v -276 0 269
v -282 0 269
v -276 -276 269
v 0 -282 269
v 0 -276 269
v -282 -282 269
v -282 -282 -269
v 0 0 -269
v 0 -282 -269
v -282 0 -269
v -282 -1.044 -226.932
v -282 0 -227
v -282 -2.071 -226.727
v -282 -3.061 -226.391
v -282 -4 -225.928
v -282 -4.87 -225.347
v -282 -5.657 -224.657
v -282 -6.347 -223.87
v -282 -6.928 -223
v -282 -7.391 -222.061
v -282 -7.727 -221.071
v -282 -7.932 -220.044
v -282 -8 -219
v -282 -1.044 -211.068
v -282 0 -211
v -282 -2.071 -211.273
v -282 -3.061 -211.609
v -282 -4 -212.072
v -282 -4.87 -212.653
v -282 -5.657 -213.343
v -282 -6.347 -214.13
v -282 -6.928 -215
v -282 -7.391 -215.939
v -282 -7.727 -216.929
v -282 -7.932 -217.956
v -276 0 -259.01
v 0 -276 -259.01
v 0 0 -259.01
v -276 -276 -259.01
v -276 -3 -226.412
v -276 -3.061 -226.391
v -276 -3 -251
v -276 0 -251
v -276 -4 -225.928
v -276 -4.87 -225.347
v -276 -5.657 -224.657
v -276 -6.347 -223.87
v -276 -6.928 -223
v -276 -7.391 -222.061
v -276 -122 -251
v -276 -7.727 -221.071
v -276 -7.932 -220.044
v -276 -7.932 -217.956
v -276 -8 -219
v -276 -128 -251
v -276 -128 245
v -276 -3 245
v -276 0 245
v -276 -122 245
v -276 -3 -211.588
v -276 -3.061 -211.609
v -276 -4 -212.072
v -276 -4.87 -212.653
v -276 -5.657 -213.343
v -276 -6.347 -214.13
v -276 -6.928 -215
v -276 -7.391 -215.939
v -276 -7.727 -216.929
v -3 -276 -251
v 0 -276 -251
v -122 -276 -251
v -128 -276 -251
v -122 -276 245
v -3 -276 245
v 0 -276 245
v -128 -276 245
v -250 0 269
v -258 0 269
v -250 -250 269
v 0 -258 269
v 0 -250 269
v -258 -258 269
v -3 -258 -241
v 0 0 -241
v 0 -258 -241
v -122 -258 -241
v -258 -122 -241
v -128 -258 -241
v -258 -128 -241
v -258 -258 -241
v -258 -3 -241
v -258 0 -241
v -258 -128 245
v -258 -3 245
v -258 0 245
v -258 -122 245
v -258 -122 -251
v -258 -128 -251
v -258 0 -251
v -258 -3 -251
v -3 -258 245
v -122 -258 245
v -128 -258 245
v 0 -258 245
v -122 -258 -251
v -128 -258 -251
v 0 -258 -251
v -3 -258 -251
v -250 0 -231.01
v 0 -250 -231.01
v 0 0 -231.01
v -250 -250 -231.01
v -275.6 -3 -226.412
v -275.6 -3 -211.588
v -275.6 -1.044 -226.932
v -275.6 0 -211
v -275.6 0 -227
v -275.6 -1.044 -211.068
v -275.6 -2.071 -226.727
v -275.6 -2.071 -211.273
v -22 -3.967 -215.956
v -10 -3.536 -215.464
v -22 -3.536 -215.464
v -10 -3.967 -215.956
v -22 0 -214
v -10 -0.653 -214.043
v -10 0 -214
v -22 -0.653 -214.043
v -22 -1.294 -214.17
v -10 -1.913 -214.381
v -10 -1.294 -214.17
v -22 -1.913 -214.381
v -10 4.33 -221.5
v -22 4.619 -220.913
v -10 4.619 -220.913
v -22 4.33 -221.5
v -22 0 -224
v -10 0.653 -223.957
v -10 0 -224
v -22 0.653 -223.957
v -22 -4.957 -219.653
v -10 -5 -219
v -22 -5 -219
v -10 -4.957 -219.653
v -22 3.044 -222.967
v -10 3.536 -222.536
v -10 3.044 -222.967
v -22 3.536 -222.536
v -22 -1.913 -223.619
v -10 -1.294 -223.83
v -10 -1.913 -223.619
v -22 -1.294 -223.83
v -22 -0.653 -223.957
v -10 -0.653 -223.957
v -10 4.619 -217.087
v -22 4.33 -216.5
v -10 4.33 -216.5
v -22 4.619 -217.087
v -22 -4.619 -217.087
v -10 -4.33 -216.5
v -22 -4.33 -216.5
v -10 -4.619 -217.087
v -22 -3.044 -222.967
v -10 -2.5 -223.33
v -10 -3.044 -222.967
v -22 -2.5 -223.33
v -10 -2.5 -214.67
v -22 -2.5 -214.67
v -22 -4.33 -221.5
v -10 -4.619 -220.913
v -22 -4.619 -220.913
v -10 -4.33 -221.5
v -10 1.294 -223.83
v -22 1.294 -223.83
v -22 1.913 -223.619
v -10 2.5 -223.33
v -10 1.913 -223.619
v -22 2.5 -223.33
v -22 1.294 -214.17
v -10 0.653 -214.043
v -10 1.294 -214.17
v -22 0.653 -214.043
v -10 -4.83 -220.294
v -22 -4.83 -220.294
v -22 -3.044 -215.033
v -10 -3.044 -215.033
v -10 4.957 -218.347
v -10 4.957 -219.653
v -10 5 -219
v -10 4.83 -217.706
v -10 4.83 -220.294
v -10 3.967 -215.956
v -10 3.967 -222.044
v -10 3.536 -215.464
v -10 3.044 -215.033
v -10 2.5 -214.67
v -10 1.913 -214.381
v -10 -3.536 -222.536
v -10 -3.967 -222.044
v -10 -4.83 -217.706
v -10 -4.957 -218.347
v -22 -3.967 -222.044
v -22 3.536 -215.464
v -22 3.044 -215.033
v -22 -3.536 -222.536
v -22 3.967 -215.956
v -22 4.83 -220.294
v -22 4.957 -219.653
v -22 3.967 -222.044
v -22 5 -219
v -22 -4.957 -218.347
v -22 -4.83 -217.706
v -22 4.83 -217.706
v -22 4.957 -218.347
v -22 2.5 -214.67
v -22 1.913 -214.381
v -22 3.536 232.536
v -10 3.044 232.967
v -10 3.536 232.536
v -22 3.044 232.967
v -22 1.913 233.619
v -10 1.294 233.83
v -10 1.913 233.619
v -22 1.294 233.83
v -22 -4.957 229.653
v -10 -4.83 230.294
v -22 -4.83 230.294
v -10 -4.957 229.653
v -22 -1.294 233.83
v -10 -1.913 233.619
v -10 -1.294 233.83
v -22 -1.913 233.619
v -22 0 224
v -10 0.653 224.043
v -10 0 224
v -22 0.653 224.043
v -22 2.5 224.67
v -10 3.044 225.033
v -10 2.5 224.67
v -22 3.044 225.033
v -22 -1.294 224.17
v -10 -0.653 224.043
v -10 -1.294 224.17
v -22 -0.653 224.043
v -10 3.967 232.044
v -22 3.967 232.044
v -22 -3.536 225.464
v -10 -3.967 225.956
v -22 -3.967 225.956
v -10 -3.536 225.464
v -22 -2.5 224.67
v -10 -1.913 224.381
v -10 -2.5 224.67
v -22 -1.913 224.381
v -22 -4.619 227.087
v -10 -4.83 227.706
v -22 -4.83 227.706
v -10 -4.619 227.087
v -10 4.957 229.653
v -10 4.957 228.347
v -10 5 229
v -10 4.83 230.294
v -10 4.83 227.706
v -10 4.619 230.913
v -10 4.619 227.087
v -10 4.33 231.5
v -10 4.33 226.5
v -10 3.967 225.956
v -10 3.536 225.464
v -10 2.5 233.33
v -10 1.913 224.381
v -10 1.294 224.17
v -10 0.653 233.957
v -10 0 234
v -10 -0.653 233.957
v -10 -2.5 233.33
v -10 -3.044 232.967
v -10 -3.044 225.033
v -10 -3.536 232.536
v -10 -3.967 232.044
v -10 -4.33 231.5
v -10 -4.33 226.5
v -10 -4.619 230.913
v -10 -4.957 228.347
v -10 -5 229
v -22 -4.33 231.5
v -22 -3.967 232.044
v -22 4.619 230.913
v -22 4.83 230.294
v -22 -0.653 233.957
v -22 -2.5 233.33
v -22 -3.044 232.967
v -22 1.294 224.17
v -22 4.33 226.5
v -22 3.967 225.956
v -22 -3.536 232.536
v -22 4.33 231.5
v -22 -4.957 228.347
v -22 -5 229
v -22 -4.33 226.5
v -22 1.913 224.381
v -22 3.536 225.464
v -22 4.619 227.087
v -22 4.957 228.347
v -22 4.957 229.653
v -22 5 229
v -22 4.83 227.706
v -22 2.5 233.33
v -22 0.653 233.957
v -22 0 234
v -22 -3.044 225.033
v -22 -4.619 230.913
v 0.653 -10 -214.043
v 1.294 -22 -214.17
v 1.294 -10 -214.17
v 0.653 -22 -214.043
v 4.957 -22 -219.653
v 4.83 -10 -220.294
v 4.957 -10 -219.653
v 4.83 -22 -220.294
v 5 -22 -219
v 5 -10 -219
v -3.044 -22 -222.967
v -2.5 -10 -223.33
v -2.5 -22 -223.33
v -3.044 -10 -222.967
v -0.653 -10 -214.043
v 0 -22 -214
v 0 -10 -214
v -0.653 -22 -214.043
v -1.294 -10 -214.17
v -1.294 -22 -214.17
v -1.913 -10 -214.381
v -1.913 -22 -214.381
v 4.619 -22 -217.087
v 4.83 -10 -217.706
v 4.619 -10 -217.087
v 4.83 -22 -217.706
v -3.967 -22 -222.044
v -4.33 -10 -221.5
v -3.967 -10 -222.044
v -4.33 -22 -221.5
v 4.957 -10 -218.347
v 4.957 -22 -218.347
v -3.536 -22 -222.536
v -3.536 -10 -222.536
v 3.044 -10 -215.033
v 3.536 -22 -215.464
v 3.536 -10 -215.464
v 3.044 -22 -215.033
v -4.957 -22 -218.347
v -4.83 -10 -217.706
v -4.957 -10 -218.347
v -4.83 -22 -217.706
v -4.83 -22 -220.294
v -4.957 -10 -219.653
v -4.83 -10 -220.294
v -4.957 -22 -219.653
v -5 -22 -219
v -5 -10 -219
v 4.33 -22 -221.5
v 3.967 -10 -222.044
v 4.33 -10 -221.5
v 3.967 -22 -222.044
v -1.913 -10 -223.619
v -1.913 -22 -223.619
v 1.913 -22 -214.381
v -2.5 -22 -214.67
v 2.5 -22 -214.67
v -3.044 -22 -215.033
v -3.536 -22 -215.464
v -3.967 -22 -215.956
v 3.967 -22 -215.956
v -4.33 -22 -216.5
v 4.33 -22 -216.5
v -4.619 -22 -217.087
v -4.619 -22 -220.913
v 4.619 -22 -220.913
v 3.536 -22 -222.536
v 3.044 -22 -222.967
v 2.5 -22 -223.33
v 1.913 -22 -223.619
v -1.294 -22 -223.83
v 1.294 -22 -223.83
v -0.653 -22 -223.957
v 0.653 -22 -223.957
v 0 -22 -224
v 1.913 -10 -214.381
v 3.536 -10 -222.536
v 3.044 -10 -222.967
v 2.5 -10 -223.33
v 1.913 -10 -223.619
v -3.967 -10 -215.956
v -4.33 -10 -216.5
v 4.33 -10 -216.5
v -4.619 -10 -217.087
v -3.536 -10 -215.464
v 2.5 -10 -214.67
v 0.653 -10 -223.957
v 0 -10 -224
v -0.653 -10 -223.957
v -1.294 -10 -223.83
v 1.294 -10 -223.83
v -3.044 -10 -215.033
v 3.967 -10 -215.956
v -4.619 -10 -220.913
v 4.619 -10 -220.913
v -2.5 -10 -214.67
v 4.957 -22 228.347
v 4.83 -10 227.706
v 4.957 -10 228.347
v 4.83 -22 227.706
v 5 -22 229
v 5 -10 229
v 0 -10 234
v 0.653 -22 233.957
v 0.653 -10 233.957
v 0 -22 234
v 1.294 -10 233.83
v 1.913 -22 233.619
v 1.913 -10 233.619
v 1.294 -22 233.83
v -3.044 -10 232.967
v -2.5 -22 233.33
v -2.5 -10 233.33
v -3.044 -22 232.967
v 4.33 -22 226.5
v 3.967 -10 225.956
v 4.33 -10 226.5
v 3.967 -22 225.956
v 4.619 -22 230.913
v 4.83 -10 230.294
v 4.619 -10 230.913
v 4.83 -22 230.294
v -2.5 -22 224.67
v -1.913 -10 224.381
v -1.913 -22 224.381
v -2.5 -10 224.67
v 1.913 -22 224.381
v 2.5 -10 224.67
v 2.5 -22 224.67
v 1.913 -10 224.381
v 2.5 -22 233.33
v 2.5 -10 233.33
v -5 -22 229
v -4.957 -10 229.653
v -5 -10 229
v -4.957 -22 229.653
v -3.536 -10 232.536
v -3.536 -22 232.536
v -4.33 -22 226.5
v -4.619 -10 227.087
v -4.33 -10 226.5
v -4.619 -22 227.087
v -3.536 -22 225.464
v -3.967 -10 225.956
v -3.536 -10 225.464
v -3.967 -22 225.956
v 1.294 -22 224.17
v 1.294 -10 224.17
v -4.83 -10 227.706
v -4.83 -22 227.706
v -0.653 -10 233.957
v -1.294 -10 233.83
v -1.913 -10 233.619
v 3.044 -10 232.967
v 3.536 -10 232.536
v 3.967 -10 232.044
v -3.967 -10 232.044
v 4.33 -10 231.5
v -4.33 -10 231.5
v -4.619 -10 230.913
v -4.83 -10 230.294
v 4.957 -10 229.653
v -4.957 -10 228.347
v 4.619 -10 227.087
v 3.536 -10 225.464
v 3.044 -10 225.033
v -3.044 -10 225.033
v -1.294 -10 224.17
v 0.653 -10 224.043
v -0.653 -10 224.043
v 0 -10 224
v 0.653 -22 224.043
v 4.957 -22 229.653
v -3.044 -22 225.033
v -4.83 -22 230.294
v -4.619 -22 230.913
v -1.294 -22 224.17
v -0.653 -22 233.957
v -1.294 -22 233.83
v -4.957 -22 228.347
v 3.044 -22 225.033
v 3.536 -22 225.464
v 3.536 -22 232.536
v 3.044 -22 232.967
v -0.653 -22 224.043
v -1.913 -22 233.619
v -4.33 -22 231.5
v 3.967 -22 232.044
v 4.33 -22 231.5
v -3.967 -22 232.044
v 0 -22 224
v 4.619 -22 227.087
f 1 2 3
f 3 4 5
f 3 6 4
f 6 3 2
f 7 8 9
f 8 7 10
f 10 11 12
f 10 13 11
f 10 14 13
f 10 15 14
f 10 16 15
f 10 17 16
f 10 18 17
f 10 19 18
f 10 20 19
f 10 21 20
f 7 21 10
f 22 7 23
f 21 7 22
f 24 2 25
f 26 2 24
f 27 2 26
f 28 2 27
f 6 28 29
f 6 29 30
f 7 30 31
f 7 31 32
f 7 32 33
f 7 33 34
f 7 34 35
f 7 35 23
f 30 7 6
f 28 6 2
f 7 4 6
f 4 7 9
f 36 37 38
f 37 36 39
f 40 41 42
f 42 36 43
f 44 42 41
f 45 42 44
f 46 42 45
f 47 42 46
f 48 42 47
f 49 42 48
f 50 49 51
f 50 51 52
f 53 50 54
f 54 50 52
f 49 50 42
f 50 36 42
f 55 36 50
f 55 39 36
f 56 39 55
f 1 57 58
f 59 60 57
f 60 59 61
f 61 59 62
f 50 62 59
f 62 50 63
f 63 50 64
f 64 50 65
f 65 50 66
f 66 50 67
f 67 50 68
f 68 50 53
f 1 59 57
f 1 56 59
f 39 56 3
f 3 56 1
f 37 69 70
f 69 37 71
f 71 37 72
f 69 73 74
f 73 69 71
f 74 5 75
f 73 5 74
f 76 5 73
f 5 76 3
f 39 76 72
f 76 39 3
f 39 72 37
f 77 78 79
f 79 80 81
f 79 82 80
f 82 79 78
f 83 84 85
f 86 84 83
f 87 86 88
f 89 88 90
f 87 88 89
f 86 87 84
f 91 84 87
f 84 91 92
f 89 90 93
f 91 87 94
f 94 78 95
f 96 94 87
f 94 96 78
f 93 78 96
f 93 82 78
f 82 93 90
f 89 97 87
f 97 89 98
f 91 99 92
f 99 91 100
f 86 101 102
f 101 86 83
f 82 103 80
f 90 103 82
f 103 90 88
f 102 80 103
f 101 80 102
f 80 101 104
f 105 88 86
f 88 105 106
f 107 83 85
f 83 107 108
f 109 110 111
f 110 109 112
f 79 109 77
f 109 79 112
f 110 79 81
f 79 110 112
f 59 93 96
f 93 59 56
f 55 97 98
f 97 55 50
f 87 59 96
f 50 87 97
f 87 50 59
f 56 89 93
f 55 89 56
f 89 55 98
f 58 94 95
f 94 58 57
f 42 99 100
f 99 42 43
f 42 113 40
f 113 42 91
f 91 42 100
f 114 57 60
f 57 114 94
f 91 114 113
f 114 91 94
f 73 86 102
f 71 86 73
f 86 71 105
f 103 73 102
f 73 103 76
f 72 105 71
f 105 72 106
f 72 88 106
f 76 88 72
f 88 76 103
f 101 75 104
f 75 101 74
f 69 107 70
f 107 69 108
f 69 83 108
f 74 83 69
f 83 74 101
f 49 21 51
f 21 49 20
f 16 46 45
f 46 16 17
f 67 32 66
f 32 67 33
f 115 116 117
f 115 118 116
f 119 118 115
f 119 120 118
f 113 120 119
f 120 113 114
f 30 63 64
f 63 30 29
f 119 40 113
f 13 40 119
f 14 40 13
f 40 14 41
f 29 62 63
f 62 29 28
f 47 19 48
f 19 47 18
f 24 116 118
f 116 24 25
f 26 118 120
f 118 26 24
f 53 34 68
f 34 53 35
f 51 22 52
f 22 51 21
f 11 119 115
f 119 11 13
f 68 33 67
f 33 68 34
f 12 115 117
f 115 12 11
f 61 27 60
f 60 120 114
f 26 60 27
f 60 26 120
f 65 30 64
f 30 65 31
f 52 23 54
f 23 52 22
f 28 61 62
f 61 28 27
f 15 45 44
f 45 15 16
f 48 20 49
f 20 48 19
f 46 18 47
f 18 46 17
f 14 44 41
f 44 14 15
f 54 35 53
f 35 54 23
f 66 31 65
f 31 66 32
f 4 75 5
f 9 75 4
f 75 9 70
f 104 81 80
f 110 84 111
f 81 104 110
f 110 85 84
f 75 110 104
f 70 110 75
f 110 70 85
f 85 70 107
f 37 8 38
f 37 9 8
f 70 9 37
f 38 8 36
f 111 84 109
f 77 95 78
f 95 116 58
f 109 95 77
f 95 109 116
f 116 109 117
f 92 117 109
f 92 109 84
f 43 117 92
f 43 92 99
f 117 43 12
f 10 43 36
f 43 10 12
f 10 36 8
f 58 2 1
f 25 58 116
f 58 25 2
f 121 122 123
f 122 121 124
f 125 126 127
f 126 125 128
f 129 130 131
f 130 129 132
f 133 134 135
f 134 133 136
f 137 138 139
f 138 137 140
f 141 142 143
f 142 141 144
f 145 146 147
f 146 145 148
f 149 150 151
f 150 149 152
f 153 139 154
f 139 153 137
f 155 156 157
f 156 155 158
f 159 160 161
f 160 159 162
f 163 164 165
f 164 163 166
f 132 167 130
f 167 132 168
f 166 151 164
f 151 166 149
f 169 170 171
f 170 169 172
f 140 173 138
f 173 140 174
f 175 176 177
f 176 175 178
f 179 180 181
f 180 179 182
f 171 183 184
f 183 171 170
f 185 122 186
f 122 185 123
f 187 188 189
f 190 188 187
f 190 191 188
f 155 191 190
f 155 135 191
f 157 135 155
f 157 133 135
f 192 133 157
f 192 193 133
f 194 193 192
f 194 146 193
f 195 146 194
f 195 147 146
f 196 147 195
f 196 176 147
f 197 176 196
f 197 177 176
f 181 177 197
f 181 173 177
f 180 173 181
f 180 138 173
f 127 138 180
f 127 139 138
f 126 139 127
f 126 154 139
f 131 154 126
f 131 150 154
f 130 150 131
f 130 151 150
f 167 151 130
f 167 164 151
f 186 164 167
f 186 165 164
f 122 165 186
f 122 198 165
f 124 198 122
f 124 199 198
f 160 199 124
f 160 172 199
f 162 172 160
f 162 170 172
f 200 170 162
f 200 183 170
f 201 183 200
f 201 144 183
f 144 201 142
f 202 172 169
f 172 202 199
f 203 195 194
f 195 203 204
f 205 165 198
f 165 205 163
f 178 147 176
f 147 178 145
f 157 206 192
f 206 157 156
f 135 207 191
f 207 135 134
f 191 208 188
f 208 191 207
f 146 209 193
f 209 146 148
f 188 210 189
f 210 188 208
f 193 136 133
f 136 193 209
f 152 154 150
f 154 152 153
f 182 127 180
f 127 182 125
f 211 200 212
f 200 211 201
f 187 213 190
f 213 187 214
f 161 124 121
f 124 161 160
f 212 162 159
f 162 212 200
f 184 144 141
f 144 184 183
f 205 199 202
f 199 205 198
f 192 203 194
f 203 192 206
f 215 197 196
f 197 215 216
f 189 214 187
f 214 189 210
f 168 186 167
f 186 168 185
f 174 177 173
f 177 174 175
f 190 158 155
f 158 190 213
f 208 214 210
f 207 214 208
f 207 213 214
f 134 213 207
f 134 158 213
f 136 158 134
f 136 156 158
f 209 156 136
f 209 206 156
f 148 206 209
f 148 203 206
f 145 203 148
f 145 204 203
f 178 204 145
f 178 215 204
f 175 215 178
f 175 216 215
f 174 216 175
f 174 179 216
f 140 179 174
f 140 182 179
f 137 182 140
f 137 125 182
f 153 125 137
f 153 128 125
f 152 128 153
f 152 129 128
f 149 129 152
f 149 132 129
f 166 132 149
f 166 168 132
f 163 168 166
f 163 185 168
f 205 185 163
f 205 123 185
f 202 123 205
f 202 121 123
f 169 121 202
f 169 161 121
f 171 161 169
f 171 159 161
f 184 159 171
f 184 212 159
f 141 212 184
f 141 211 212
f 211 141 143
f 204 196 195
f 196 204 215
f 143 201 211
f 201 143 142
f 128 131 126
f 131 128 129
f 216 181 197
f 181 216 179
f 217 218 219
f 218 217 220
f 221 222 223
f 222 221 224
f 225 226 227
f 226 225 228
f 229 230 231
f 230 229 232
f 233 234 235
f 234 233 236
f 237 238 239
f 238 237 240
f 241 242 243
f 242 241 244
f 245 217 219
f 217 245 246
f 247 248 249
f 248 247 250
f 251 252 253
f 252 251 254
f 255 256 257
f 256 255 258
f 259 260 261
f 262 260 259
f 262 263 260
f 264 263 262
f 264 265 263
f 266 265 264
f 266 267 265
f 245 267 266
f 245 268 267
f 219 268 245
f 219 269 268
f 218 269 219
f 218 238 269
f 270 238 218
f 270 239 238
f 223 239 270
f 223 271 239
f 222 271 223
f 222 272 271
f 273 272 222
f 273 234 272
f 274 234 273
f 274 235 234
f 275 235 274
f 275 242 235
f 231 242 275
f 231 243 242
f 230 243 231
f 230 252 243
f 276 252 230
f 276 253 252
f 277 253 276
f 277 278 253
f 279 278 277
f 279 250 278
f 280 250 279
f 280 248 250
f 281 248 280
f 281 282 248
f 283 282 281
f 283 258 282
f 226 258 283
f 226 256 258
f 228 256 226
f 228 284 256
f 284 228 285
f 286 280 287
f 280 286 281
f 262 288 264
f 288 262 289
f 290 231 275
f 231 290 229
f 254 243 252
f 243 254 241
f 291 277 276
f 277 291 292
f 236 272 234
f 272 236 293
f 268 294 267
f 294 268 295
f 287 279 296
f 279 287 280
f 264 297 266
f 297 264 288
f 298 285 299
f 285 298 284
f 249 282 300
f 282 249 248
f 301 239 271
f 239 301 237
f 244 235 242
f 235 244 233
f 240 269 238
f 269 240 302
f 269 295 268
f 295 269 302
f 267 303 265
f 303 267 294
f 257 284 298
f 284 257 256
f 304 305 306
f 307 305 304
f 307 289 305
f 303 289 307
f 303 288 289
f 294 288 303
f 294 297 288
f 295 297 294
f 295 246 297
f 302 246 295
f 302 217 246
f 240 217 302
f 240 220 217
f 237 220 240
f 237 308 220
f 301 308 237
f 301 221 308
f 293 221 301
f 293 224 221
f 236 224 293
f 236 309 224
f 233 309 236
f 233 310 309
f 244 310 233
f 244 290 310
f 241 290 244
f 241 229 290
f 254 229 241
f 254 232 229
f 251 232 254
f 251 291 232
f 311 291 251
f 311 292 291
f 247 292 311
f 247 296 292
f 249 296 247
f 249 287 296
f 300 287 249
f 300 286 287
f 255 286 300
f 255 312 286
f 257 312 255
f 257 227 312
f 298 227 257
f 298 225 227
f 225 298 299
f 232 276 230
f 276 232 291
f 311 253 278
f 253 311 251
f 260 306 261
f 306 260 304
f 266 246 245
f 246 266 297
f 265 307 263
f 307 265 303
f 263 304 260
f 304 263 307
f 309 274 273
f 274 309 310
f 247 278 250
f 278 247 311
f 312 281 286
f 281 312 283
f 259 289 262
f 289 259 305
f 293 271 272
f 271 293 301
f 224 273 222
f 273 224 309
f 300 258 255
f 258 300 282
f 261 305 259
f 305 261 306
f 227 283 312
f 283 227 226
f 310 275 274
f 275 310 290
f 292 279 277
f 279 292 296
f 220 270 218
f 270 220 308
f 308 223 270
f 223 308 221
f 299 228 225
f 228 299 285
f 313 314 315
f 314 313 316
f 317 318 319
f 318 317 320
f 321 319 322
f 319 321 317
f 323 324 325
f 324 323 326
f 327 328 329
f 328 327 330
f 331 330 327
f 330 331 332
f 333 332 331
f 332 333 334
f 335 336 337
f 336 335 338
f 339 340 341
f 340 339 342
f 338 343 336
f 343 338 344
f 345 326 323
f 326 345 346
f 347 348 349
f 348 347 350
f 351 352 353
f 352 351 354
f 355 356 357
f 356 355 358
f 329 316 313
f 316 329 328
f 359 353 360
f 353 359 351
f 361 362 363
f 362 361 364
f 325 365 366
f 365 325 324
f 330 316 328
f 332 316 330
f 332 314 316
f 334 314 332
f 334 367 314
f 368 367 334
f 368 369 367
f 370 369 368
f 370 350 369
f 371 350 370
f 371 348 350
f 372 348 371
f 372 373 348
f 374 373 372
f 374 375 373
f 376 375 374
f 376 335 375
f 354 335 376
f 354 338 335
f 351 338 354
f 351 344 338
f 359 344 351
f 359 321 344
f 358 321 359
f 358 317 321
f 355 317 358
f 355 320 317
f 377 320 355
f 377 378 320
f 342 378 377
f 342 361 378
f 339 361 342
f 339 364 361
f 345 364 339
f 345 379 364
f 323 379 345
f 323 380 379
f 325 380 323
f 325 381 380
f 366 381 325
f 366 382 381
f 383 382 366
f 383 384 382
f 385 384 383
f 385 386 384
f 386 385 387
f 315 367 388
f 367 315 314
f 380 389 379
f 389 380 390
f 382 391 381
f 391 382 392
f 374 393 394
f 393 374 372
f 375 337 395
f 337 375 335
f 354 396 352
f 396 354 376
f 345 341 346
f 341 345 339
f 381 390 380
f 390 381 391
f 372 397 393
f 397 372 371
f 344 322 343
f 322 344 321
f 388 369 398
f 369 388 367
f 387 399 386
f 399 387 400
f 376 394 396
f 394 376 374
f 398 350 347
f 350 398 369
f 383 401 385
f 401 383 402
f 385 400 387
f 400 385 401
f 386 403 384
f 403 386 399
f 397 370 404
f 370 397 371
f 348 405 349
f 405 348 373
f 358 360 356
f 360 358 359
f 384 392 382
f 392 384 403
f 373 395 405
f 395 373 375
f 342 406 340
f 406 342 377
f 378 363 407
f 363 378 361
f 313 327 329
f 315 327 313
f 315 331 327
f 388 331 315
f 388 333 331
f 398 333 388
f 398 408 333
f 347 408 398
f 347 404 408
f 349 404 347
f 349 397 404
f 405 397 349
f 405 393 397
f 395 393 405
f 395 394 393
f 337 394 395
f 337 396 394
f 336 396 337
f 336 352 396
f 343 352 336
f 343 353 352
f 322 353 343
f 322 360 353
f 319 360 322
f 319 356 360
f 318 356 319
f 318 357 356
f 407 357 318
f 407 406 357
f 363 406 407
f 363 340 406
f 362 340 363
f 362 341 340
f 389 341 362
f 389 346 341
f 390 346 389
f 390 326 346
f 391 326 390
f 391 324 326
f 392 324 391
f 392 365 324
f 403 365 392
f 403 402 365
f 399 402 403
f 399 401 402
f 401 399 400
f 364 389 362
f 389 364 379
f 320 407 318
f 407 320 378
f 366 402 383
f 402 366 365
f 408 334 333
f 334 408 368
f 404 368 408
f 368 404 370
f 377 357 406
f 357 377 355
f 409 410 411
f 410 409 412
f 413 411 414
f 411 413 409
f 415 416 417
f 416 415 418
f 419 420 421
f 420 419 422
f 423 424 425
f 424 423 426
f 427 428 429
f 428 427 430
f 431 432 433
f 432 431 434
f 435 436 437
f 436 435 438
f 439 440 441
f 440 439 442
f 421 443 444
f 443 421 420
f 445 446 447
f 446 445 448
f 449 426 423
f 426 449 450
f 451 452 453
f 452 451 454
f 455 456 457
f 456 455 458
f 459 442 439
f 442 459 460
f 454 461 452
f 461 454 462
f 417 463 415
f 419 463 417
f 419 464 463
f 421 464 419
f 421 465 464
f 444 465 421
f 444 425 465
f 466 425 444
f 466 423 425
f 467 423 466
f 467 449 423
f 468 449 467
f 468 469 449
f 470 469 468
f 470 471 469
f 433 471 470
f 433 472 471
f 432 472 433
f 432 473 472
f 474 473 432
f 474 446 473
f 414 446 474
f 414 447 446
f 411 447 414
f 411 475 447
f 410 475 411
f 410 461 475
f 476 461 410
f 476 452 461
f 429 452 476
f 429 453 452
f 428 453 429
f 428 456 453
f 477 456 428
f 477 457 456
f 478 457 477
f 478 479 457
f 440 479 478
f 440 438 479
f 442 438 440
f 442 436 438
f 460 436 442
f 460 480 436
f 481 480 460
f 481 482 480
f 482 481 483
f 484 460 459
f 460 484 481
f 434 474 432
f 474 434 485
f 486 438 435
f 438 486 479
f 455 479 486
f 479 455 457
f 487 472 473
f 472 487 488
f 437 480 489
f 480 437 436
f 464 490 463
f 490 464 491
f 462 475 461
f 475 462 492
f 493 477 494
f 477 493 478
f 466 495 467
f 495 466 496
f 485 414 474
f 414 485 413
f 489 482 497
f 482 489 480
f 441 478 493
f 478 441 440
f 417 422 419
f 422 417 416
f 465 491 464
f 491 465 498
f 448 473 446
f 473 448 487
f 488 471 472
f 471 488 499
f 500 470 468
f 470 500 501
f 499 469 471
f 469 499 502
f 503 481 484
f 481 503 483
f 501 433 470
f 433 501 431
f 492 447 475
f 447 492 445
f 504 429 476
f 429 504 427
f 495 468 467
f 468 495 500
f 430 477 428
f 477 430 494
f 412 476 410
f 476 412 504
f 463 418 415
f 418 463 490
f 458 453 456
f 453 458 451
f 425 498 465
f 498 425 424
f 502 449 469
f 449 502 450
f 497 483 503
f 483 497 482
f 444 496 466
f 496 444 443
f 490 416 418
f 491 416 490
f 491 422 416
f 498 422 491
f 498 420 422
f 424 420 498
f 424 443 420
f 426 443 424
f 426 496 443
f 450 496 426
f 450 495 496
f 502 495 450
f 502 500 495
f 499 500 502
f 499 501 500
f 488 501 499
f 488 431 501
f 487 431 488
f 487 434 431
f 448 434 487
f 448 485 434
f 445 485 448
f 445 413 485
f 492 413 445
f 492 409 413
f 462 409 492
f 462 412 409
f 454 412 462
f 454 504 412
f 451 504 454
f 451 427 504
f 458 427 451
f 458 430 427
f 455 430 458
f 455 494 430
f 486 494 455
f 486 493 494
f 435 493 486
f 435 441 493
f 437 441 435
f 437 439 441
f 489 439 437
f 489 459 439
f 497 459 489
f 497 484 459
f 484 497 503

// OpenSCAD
/*
  Modular foam-fill planter shell (OpenSCAD)

  Goals:
  - Minimum internal soil volume: 500x500x500 mm (configurable, set >= 500)
  - Double-wall construction with an intentional foam cavity between outer shell and inner liner
  - Split into grid pieces so smaller printers can produce parts
  - Added structural ribs and thick base/walls for heavy soil loads
*/

$fn = 48;

// ---------------------------
// Core dimensions (mm)
// ---------------------------
inner_x = 500;   // minimum 500
inner_y = 500;   // minimum 500
inner_z = 500;   // minimum 500

// Structural thicknesses (tune for strength)
liner_wall_t = 8;    // inner wall touching soil
liner_base_t = 10;   // bottom of soil cavity
foam_gap_t   = 18;   // intentional void for polyurethane foam fill
outer_wall_t = 6;    // external shell wall
outer_base_t = 10;   // external shell base

// Reinforcement between outer shell and liner
rib_t = 6;
rib_count_per_side = 3;

// Split settings for small printers
split_x = 2;
split_y = 2;
piece_ix = 0;      // [0 : split_x-1]
piece_iy = 0;      // [0 : split_y-1]
part = "piece";    // ["piece", "full_preview"]

// Seam connectors
pin_d = 10;
pin_len = 12;
pin_clearance = 0.35;
pin_edge_offset = 22;

// Foam fill / vent ports
port_d = 16;
port_z_from_base = 40;

// ---------------------------
// Derived dimensions
// ---------------------------
ox = inner_x + 2*(liner_wall_t + foam_gap_t + outer_wall_t);
oy = inner_y + 2*(liner_wall_t + foam_gap_t + outer_wall_t);
oz = inner_z + liner_base_t + foam_gap_t + outer_base_t;

liner_ox = inner_x + 2*liner_wall_t;
liner_oy = inner_y + 2*liner_wall_t;
liner_oz = inner_z + liner_base_t;

soil_bottom_z = -oz/2 + outer_base_t + foam_gap_t + liner_base_t;

function x_min(i) = -ox/2 + i*ox/split_x;
function x_max(i) = -ox/2 + (i+1)*ox/split_x;
function y_min(j) = -oy/2 + j*oy/split_y;
function y_max(j) = -oy/2 + (j+1)*oy/split_y;

module outer_shell_only() {
  difference() {
    cube([ox, oy, oz], center=true);
    translate([0, 0, outer_base_t/2])
      cube([ox - 2*outer_wall_t, oy - 2*outer_wall_t, oz - outer_base_t + 0.02], center=true);
  }
}

module inner_liner_only() {
  difference() {
    translate([0, 0, -oz/2 + outer_base_t + foam_gap_t + liner_oz/2])
      cube([liner_ox, liner_oy, liner_oz], center=true);

    // Soil chamber (open top)
    translate([0, 0, -oz/2 + outer_base_t + foam_gap_t + liner_base_t + inner_z/2])
      cube([inner_x, inner_y, inner_z + 0.02], center=true);
  }
}

module tie_ribs() {
  // Ribs connect outer shell and inner liner for load transfer.
  // They are sparse so foam can still flow around/through during fill.

  z0 = -oz/2 + outer_base_t + 8;
  z1 = oz/2 - 24;
  step = (inner_y) / (rib_count_per_side + 1);

  // X-direction walls (left/right)
  for (k = [1 : rib_count_per_side]) {
    yy = -inner_y/2 + k*step;
    for (sx = [-1, 1]) {
      x_mid = sx*(inner_x/2 + liner_wall_t + foam_gap_t/2);
      translate([x_mid, yy, (z0+z1)/2])
        cube([foam_gap_t, rib_t, z1-z0], center=true);
    }
  }

  // Y-direction walls (front/back)
  stepx = (inner_x) / (rib_count_per_side + 1);
  for (k = [1 : rib_count_per_side]) {
    xx = -inner_x/2 + k*stepx;
    for (sy = [-1, 1]) {
      y_mid = sy*(inner_y/2 + liner_wall_t + foam_gap_t/2);
      translate([xx, y_mid, (z0+z1)/2])
        cube([rib_t, foam_gap_t, z1-z0], center=true);
    }
  }
}

module foam_ports() {
  // Ports into foam cavity; can be plugged after foam expansion.
  for (sx = [-1, 1]) {
    translate([sx*(ox/2 - outer_wall_t/2), 0, -oz/2 + outer_base_t + port_z_from_base])
      rotate([0, 90, 0])
        cylinder(h=outer_wall_t + 0.8, d=port_d, center=true);
  }
}

module full_planter() {
  difference() {
    union() {
      outer_shell_only();
      inner_liner_only();
      tie_ribs();
    }
    foam_ports();
  }
}

module piece_bounds(ix, iy) {
  x0 = x_min(ix);
  x1 = x_max(ix);
  y0 = y_min(iy);
  y1 = y_max(iy);
  translate([(x0+x1)/2, (y0+y1)/2, 0])
    cube([x1-x0, y1-y0, oz + 2], center=true);
}

module seam_pins_male(ix, iy) {
  za = -oz/2 + 50;
  zb = oz/2 - 40;

  if (ix < split_x-1) {
    for (zz = [za, zb])
      translate([x_max(ix) - pin_edge_offset, 0, zz])
        rotate([0, 90, 0])
          cylinder(h=pin_len, d=pin_d, center=false);
  }

  if (iy < split_y-1) {
    for (zz = [za, zb])
      translate([0, y_max(iy) - pin_edge_offset, zz])
        rotate([-90, 0, 0])
          cylinder(h=pin_len, d=pin_d, center=false);
  }
}

module seam_pins_female(ix, iy) {
  za = -oz/2 + 50;
  zb = oz/2 - 40;

  if (ix > 0) {
    for (zz = [za, zb])
      translate([x_min(ix) + pin_edge_offset - pin_len, 0, zz])
        rotate([0, 90, 0])
          cylinder(h=pin_len + 0.8, d=pin_d + pin_clearance, center=false);
  }

  if (iy > 0) {
    for (zz = [za, zb])
      translate([0, y_min(iy) + pin_edge_offset - pin_len, zz])
        rotate([-90, 0, 0])
          cylinder(h=pin_len + 0.8, d=pin_d + pin_clearance, center=false);
  }
}

module piece(ix, iy) {
  difference() {
    union() {
      intersection() {
        full_planter();
        piece_bounds(ix, iy);
      }
      seam_pins_male(ix, iy);
    }
    seam_pins_female(ix, iy);
  }
}

if (part == "full_preview") {
  full_planter();
} else {
  piece(piece_ix, piece_iy);
}
